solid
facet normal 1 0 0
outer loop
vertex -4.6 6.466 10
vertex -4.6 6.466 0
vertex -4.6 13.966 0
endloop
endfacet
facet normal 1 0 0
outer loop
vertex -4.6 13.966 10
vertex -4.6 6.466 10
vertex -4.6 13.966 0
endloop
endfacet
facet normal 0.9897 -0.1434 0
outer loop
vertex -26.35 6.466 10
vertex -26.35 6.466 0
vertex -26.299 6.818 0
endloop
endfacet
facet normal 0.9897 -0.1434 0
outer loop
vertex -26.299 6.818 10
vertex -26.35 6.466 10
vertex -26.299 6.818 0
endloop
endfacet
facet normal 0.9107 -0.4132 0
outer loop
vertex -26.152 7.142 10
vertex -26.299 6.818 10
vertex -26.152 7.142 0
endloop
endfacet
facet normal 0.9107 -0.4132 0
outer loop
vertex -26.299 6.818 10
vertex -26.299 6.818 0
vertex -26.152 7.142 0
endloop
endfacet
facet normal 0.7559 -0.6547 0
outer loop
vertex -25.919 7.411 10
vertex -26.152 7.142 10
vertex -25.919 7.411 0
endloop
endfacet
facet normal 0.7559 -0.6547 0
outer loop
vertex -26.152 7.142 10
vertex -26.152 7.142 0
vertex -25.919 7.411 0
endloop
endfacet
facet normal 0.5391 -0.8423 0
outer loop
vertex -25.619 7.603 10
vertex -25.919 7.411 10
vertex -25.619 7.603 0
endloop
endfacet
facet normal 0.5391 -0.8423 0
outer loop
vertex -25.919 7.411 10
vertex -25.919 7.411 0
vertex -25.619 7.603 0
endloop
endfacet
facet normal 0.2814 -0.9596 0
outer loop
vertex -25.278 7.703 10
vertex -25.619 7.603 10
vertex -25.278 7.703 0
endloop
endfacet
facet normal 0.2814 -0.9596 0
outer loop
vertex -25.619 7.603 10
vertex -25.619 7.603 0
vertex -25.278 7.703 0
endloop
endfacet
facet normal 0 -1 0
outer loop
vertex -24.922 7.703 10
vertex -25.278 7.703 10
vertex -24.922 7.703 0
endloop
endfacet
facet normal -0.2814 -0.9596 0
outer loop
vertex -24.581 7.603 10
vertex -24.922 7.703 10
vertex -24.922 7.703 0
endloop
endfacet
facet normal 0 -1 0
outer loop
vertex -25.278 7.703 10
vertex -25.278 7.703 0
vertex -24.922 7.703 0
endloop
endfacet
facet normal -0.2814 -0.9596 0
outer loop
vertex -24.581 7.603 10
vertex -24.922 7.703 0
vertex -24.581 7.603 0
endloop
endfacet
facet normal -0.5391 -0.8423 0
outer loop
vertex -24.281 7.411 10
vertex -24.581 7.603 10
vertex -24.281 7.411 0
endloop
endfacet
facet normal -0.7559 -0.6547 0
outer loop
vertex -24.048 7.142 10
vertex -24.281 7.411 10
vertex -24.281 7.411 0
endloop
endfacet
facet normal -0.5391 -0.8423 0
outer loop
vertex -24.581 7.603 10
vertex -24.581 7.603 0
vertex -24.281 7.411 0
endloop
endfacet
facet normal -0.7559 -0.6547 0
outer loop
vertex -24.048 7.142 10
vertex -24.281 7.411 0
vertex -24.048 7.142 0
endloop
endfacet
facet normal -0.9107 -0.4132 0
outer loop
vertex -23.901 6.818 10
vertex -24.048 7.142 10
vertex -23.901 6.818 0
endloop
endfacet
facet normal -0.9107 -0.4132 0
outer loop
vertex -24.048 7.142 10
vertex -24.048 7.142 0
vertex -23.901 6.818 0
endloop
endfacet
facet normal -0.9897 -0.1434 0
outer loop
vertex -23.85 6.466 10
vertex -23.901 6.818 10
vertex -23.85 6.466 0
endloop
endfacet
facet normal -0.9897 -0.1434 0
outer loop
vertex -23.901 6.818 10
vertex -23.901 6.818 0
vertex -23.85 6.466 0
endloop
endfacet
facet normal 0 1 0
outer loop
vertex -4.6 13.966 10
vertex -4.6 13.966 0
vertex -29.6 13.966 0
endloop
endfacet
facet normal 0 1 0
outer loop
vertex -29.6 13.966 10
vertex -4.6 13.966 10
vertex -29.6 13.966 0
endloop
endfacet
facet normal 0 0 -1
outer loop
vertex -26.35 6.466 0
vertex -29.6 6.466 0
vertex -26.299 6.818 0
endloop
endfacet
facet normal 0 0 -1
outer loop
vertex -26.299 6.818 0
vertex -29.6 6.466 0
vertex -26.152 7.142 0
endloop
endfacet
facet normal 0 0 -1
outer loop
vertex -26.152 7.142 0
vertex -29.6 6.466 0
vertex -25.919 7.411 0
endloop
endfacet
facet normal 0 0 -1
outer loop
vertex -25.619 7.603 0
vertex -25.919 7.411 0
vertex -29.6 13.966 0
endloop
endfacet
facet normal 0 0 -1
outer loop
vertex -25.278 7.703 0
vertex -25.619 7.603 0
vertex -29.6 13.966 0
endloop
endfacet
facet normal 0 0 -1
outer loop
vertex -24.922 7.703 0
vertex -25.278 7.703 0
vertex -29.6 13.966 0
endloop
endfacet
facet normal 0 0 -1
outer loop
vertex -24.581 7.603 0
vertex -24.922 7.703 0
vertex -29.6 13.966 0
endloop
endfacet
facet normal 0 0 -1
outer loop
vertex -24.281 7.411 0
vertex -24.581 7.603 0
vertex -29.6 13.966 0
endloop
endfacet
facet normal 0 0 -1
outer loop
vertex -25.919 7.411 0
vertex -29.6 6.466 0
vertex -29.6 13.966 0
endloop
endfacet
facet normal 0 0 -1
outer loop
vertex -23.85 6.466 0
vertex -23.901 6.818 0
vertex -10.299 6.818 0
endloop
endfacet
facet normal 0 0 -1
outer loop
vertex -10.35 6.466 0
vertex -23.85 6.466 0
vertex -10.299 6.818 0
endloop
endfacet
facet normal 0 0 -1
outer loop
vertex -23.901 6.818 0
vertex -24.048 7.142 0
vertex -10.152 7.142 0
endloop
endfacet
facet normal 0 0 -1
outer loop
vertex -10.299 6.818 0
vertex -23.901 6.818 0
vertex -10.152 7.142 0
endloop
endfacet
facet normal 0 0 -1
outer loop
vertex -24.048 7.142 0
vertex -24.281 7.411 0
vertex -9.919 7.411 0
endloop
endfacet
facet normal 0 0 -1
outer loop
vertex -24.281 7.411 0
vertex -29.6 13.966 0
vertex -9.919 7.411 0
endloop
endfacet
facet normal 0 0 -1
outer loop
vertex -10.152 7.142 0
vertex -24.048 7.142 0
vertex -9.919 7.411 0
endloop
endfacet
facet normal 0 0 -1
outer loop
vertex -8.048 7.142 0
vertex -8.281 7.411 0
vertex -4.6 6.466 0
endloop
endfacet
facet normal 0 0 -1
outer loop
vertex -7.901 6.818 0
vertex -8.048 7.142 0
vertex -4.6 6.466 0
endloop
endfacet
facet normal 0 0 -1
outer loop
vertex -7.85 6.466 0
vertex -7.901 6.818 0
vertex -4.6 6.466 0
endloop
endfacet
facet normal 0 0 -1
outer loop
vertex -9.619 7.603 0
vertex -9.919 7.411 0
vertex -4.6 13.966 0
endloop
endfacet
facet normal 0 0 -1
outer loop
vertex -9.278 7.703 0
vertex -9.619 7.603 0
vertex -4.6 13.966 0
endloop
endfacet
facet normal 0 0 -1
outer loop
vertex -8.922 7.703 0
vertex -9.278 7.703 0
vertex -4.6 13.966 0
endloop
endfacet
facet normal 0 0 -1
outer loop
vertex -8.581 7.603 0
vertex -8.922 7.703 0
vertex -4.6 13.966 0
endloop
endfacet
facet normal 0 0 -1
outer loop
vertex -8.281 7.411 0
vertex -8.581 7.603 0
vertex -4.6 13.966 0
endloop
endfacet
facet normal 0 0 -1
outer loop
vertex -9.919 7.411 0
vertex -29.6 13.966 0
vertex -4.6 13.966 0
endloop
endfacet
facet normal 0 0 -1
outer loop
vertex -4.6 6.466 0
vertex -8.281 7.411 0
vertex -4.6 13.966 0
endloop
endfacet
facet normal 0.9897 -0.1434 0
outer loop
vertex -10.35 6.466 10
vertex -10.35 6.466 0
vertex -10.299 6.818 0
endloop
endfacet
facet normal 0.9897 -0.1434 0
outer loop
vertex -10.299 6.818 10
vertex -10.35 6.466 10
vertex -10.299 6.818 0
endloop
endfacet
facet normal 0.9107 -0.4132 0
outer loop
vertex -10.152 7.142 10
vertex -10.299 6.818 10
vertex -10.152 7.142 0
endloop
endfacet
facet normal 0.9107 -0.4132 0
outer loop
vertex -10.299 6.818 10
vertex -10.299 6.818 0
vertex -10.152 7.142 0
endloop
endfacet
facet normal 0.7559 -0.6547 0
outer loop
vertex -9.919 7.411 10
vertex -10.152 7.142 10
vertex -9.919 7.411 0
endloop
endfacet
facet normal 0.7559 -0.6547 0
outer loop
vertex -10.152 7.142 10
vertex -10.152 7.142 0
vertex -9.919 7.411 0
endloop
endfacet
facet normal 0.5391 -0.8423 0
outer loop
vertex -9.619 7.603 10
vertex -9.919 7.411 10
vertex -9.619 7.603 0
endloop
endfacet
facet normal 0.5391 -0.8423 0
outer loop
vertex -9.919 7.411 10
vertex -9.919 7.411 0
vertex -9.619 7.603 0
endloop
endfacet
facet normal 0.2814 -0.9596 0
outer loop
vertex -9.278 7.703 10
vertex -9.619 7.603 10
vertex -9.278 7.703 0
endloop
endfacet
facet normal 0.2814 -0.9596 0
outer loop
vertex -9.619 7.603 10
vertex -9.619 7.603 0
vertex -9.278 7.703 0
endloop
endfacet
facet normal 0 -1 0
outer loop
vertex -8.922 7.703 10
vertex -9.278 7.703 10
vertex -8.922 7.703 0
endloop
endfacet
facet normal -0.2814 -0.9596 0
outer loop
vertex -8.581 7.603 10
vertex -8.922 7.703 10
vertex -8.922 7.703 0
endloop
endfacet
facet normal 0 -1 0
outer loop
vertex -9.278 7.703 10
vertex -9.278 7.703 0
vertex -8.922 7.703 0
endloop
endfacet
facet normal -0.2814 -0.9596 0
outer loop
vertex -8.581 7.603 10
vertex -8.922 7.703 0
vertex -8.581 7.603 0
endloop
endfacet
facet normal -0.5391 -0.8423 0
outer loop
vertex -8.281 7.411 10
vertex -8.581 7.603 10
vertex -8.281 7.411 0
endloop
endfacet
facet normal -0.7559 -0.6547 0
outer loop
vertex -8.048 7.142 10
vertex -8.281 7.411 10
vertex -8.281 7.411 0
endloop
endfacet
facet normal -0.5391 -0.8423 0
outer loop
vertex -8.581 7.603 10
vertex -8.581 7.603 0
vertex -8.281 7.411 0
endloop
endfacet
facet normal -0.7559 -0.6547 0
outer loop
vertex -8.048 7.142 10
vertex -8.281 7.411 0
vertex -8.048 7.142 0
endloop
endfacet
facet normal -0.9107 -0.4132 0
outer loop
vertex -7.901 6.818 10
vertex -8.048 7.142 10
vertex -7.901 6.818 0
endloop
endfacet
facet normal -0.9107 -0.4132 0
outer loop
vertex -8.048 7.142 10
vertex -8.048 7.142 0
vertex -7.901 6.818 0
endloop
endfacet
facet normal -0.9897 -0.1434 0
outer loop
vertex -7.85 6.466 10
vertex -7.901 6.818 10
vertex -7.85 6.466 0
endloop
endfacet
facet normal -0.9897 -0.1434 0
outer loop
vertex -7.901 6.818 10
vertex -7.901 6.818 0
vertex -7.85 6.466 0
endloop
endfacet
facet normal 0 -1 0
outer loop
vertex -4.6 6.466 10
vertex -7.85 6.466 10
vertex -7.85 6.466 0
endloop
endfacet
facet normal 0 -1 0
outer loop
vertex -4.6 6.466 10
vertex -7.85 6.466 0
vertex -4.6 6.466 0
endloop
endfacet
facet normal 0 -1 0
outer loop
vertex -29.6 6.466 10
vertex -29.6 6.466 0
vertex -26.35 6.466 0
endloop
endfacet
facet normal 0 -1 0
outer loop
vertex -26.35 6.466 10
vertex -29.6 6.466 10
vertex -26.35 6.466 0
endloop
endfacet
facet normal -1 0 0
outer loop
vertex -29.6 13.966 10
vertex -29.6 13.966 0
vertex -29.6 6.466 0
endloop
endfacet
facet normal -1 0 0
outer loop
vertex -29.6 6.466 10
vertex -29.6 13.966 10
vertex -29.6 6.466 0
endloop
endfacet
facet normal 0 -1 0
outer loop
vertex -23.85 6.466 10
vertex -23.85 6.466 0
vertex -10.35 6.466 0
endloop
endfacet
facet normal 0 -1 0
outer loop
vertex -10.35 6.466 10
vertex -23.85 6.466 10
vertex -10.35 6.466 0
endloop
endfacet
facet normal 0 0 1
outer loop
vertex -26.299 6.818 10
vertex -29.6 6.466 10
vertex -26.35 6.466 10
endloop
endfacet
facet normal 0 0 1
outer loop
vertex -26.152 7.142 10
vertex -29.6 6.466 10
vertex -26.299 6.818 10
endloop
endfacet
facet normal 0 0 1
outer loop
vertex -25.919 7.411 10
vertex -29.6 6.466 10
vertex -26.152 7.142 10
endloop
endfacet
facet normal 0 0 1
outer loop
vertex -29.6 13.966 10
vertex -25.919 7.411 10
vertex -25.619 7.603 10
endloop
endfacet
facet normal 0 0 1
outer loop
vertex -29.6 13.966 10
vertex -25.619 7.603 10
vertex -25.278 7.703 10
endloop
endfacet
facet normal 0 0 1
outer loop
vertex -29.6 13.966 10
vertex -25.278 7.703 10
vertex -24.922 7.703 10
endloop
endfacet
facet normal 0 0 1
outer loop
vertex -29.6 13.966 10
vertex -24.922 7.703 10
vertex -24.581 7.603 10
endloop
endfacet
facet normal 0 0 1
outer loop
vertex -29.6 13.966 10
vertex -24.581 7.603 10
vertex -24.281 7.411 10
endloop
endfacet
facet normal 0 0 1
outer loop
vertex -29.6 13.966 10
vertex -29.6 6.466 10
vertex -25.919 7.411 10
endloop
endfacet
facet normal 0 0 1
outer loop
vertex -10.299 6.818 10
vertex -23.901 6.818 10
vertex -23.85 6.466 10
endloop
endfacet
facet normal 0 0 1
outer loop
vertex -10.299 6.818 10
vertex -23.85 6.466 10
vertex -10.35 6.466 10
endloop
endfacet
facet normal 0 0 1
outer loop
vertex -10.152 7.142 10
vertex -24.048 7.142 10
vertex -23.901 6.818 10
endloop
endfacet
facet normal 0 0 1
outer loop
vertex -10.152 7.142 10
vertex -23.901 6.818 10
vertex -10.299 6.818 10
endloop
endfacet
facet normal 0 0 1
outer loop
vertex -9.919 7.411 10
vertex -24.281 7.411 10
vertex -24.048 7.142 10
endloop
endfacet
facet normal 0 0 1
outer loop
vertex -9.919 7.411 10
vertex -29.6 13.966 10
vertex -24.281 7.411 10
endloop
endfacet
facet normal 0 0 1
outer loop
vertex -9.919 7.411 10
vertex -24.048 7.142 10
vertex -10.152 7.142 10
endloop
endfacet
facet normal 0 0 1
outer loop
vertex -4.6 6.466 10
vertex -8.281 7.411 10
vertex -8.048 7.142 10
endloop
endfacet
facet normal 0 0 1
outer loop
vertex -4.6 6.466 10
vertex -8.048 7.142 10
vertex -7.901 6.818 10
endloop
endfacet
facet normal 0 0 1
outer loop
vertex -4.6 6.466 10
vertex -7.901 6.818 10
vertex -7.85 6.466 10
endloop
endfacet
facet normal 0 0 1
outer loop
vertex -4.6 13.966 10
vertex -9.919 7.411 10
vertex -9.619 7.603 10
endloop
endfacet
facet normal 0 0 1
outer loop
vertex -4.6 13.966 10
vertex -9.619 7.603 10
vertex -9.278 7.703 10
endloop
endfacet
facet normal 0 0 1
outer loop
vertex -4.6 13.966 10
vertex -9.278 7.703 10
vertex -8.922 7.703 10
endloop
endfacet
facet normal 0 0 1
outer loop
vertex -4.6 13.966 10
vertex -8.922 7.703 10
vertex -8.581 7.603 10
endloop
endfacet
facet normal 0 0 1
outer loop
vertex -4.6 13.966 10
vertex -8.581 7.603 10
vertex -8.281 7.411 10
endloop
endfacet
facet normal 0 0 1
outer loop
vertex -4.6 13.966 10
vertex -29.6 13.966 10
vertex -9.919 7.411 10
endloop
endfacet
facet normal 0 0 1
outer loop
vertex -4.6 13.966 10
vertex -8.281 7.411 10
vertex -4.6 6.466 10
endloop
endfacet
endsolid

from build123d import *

# Parameters (mm, degrees)
F1_DEPTH = 10


with BuildPart() as f1:
    # F0 (on Top) → F1 (new body)
    with BuildSketch(Plane.XY):
        with BuildLine():
            Line((-17.0999729578, 13.9659811929), (-29.5999729578, 13.9659811929))
            Line((-29.5999729578, 13.9659811929), (-29.5999729578, 6.4659811929))
            Line((-29.5999729578, 6.4659811929), (-26.3499729578, 6.4659811929))
            ThreePointArc((-26.3499729578, 6.4659811929), (-25.0999729578, 7.7159811929), (-23.8499729578, 6.4659811929))
            Line((-23.8499729578, 6.4659811929), (-17.0999729578, 6.4659811929))
            Line((-17.0999729578, 6.4659811929), (-17.0999729578, 13.9659811929))
        make_face()
        with BuildLine():
            Line((-4.5999729578, 13.9659811929), (-17.0999729578, 13.9659811929))
            Line((-17.0999729578, 13.9659811929), (-17.0999729578, 6.4659811929))
            Line((-17.0999729578, 6.4659811929), (-10.3499729578, 6.4659811929))
            ThreePointArc((-10.3499729578, 6.4659811929), (-9.0999729578, 7.7159811929), (-7.8499729578, 6.4659811929))
            Line((-7.8499729578, 6.4659811929), (-4.5999729578, 6.4659811929))
            Line((-4.5999729578, 6.4659811929), (-4.5999729578, 13.9659811929))
        make_face()
    extrude(amount=F1_DEPTH)


solid = f1.part
